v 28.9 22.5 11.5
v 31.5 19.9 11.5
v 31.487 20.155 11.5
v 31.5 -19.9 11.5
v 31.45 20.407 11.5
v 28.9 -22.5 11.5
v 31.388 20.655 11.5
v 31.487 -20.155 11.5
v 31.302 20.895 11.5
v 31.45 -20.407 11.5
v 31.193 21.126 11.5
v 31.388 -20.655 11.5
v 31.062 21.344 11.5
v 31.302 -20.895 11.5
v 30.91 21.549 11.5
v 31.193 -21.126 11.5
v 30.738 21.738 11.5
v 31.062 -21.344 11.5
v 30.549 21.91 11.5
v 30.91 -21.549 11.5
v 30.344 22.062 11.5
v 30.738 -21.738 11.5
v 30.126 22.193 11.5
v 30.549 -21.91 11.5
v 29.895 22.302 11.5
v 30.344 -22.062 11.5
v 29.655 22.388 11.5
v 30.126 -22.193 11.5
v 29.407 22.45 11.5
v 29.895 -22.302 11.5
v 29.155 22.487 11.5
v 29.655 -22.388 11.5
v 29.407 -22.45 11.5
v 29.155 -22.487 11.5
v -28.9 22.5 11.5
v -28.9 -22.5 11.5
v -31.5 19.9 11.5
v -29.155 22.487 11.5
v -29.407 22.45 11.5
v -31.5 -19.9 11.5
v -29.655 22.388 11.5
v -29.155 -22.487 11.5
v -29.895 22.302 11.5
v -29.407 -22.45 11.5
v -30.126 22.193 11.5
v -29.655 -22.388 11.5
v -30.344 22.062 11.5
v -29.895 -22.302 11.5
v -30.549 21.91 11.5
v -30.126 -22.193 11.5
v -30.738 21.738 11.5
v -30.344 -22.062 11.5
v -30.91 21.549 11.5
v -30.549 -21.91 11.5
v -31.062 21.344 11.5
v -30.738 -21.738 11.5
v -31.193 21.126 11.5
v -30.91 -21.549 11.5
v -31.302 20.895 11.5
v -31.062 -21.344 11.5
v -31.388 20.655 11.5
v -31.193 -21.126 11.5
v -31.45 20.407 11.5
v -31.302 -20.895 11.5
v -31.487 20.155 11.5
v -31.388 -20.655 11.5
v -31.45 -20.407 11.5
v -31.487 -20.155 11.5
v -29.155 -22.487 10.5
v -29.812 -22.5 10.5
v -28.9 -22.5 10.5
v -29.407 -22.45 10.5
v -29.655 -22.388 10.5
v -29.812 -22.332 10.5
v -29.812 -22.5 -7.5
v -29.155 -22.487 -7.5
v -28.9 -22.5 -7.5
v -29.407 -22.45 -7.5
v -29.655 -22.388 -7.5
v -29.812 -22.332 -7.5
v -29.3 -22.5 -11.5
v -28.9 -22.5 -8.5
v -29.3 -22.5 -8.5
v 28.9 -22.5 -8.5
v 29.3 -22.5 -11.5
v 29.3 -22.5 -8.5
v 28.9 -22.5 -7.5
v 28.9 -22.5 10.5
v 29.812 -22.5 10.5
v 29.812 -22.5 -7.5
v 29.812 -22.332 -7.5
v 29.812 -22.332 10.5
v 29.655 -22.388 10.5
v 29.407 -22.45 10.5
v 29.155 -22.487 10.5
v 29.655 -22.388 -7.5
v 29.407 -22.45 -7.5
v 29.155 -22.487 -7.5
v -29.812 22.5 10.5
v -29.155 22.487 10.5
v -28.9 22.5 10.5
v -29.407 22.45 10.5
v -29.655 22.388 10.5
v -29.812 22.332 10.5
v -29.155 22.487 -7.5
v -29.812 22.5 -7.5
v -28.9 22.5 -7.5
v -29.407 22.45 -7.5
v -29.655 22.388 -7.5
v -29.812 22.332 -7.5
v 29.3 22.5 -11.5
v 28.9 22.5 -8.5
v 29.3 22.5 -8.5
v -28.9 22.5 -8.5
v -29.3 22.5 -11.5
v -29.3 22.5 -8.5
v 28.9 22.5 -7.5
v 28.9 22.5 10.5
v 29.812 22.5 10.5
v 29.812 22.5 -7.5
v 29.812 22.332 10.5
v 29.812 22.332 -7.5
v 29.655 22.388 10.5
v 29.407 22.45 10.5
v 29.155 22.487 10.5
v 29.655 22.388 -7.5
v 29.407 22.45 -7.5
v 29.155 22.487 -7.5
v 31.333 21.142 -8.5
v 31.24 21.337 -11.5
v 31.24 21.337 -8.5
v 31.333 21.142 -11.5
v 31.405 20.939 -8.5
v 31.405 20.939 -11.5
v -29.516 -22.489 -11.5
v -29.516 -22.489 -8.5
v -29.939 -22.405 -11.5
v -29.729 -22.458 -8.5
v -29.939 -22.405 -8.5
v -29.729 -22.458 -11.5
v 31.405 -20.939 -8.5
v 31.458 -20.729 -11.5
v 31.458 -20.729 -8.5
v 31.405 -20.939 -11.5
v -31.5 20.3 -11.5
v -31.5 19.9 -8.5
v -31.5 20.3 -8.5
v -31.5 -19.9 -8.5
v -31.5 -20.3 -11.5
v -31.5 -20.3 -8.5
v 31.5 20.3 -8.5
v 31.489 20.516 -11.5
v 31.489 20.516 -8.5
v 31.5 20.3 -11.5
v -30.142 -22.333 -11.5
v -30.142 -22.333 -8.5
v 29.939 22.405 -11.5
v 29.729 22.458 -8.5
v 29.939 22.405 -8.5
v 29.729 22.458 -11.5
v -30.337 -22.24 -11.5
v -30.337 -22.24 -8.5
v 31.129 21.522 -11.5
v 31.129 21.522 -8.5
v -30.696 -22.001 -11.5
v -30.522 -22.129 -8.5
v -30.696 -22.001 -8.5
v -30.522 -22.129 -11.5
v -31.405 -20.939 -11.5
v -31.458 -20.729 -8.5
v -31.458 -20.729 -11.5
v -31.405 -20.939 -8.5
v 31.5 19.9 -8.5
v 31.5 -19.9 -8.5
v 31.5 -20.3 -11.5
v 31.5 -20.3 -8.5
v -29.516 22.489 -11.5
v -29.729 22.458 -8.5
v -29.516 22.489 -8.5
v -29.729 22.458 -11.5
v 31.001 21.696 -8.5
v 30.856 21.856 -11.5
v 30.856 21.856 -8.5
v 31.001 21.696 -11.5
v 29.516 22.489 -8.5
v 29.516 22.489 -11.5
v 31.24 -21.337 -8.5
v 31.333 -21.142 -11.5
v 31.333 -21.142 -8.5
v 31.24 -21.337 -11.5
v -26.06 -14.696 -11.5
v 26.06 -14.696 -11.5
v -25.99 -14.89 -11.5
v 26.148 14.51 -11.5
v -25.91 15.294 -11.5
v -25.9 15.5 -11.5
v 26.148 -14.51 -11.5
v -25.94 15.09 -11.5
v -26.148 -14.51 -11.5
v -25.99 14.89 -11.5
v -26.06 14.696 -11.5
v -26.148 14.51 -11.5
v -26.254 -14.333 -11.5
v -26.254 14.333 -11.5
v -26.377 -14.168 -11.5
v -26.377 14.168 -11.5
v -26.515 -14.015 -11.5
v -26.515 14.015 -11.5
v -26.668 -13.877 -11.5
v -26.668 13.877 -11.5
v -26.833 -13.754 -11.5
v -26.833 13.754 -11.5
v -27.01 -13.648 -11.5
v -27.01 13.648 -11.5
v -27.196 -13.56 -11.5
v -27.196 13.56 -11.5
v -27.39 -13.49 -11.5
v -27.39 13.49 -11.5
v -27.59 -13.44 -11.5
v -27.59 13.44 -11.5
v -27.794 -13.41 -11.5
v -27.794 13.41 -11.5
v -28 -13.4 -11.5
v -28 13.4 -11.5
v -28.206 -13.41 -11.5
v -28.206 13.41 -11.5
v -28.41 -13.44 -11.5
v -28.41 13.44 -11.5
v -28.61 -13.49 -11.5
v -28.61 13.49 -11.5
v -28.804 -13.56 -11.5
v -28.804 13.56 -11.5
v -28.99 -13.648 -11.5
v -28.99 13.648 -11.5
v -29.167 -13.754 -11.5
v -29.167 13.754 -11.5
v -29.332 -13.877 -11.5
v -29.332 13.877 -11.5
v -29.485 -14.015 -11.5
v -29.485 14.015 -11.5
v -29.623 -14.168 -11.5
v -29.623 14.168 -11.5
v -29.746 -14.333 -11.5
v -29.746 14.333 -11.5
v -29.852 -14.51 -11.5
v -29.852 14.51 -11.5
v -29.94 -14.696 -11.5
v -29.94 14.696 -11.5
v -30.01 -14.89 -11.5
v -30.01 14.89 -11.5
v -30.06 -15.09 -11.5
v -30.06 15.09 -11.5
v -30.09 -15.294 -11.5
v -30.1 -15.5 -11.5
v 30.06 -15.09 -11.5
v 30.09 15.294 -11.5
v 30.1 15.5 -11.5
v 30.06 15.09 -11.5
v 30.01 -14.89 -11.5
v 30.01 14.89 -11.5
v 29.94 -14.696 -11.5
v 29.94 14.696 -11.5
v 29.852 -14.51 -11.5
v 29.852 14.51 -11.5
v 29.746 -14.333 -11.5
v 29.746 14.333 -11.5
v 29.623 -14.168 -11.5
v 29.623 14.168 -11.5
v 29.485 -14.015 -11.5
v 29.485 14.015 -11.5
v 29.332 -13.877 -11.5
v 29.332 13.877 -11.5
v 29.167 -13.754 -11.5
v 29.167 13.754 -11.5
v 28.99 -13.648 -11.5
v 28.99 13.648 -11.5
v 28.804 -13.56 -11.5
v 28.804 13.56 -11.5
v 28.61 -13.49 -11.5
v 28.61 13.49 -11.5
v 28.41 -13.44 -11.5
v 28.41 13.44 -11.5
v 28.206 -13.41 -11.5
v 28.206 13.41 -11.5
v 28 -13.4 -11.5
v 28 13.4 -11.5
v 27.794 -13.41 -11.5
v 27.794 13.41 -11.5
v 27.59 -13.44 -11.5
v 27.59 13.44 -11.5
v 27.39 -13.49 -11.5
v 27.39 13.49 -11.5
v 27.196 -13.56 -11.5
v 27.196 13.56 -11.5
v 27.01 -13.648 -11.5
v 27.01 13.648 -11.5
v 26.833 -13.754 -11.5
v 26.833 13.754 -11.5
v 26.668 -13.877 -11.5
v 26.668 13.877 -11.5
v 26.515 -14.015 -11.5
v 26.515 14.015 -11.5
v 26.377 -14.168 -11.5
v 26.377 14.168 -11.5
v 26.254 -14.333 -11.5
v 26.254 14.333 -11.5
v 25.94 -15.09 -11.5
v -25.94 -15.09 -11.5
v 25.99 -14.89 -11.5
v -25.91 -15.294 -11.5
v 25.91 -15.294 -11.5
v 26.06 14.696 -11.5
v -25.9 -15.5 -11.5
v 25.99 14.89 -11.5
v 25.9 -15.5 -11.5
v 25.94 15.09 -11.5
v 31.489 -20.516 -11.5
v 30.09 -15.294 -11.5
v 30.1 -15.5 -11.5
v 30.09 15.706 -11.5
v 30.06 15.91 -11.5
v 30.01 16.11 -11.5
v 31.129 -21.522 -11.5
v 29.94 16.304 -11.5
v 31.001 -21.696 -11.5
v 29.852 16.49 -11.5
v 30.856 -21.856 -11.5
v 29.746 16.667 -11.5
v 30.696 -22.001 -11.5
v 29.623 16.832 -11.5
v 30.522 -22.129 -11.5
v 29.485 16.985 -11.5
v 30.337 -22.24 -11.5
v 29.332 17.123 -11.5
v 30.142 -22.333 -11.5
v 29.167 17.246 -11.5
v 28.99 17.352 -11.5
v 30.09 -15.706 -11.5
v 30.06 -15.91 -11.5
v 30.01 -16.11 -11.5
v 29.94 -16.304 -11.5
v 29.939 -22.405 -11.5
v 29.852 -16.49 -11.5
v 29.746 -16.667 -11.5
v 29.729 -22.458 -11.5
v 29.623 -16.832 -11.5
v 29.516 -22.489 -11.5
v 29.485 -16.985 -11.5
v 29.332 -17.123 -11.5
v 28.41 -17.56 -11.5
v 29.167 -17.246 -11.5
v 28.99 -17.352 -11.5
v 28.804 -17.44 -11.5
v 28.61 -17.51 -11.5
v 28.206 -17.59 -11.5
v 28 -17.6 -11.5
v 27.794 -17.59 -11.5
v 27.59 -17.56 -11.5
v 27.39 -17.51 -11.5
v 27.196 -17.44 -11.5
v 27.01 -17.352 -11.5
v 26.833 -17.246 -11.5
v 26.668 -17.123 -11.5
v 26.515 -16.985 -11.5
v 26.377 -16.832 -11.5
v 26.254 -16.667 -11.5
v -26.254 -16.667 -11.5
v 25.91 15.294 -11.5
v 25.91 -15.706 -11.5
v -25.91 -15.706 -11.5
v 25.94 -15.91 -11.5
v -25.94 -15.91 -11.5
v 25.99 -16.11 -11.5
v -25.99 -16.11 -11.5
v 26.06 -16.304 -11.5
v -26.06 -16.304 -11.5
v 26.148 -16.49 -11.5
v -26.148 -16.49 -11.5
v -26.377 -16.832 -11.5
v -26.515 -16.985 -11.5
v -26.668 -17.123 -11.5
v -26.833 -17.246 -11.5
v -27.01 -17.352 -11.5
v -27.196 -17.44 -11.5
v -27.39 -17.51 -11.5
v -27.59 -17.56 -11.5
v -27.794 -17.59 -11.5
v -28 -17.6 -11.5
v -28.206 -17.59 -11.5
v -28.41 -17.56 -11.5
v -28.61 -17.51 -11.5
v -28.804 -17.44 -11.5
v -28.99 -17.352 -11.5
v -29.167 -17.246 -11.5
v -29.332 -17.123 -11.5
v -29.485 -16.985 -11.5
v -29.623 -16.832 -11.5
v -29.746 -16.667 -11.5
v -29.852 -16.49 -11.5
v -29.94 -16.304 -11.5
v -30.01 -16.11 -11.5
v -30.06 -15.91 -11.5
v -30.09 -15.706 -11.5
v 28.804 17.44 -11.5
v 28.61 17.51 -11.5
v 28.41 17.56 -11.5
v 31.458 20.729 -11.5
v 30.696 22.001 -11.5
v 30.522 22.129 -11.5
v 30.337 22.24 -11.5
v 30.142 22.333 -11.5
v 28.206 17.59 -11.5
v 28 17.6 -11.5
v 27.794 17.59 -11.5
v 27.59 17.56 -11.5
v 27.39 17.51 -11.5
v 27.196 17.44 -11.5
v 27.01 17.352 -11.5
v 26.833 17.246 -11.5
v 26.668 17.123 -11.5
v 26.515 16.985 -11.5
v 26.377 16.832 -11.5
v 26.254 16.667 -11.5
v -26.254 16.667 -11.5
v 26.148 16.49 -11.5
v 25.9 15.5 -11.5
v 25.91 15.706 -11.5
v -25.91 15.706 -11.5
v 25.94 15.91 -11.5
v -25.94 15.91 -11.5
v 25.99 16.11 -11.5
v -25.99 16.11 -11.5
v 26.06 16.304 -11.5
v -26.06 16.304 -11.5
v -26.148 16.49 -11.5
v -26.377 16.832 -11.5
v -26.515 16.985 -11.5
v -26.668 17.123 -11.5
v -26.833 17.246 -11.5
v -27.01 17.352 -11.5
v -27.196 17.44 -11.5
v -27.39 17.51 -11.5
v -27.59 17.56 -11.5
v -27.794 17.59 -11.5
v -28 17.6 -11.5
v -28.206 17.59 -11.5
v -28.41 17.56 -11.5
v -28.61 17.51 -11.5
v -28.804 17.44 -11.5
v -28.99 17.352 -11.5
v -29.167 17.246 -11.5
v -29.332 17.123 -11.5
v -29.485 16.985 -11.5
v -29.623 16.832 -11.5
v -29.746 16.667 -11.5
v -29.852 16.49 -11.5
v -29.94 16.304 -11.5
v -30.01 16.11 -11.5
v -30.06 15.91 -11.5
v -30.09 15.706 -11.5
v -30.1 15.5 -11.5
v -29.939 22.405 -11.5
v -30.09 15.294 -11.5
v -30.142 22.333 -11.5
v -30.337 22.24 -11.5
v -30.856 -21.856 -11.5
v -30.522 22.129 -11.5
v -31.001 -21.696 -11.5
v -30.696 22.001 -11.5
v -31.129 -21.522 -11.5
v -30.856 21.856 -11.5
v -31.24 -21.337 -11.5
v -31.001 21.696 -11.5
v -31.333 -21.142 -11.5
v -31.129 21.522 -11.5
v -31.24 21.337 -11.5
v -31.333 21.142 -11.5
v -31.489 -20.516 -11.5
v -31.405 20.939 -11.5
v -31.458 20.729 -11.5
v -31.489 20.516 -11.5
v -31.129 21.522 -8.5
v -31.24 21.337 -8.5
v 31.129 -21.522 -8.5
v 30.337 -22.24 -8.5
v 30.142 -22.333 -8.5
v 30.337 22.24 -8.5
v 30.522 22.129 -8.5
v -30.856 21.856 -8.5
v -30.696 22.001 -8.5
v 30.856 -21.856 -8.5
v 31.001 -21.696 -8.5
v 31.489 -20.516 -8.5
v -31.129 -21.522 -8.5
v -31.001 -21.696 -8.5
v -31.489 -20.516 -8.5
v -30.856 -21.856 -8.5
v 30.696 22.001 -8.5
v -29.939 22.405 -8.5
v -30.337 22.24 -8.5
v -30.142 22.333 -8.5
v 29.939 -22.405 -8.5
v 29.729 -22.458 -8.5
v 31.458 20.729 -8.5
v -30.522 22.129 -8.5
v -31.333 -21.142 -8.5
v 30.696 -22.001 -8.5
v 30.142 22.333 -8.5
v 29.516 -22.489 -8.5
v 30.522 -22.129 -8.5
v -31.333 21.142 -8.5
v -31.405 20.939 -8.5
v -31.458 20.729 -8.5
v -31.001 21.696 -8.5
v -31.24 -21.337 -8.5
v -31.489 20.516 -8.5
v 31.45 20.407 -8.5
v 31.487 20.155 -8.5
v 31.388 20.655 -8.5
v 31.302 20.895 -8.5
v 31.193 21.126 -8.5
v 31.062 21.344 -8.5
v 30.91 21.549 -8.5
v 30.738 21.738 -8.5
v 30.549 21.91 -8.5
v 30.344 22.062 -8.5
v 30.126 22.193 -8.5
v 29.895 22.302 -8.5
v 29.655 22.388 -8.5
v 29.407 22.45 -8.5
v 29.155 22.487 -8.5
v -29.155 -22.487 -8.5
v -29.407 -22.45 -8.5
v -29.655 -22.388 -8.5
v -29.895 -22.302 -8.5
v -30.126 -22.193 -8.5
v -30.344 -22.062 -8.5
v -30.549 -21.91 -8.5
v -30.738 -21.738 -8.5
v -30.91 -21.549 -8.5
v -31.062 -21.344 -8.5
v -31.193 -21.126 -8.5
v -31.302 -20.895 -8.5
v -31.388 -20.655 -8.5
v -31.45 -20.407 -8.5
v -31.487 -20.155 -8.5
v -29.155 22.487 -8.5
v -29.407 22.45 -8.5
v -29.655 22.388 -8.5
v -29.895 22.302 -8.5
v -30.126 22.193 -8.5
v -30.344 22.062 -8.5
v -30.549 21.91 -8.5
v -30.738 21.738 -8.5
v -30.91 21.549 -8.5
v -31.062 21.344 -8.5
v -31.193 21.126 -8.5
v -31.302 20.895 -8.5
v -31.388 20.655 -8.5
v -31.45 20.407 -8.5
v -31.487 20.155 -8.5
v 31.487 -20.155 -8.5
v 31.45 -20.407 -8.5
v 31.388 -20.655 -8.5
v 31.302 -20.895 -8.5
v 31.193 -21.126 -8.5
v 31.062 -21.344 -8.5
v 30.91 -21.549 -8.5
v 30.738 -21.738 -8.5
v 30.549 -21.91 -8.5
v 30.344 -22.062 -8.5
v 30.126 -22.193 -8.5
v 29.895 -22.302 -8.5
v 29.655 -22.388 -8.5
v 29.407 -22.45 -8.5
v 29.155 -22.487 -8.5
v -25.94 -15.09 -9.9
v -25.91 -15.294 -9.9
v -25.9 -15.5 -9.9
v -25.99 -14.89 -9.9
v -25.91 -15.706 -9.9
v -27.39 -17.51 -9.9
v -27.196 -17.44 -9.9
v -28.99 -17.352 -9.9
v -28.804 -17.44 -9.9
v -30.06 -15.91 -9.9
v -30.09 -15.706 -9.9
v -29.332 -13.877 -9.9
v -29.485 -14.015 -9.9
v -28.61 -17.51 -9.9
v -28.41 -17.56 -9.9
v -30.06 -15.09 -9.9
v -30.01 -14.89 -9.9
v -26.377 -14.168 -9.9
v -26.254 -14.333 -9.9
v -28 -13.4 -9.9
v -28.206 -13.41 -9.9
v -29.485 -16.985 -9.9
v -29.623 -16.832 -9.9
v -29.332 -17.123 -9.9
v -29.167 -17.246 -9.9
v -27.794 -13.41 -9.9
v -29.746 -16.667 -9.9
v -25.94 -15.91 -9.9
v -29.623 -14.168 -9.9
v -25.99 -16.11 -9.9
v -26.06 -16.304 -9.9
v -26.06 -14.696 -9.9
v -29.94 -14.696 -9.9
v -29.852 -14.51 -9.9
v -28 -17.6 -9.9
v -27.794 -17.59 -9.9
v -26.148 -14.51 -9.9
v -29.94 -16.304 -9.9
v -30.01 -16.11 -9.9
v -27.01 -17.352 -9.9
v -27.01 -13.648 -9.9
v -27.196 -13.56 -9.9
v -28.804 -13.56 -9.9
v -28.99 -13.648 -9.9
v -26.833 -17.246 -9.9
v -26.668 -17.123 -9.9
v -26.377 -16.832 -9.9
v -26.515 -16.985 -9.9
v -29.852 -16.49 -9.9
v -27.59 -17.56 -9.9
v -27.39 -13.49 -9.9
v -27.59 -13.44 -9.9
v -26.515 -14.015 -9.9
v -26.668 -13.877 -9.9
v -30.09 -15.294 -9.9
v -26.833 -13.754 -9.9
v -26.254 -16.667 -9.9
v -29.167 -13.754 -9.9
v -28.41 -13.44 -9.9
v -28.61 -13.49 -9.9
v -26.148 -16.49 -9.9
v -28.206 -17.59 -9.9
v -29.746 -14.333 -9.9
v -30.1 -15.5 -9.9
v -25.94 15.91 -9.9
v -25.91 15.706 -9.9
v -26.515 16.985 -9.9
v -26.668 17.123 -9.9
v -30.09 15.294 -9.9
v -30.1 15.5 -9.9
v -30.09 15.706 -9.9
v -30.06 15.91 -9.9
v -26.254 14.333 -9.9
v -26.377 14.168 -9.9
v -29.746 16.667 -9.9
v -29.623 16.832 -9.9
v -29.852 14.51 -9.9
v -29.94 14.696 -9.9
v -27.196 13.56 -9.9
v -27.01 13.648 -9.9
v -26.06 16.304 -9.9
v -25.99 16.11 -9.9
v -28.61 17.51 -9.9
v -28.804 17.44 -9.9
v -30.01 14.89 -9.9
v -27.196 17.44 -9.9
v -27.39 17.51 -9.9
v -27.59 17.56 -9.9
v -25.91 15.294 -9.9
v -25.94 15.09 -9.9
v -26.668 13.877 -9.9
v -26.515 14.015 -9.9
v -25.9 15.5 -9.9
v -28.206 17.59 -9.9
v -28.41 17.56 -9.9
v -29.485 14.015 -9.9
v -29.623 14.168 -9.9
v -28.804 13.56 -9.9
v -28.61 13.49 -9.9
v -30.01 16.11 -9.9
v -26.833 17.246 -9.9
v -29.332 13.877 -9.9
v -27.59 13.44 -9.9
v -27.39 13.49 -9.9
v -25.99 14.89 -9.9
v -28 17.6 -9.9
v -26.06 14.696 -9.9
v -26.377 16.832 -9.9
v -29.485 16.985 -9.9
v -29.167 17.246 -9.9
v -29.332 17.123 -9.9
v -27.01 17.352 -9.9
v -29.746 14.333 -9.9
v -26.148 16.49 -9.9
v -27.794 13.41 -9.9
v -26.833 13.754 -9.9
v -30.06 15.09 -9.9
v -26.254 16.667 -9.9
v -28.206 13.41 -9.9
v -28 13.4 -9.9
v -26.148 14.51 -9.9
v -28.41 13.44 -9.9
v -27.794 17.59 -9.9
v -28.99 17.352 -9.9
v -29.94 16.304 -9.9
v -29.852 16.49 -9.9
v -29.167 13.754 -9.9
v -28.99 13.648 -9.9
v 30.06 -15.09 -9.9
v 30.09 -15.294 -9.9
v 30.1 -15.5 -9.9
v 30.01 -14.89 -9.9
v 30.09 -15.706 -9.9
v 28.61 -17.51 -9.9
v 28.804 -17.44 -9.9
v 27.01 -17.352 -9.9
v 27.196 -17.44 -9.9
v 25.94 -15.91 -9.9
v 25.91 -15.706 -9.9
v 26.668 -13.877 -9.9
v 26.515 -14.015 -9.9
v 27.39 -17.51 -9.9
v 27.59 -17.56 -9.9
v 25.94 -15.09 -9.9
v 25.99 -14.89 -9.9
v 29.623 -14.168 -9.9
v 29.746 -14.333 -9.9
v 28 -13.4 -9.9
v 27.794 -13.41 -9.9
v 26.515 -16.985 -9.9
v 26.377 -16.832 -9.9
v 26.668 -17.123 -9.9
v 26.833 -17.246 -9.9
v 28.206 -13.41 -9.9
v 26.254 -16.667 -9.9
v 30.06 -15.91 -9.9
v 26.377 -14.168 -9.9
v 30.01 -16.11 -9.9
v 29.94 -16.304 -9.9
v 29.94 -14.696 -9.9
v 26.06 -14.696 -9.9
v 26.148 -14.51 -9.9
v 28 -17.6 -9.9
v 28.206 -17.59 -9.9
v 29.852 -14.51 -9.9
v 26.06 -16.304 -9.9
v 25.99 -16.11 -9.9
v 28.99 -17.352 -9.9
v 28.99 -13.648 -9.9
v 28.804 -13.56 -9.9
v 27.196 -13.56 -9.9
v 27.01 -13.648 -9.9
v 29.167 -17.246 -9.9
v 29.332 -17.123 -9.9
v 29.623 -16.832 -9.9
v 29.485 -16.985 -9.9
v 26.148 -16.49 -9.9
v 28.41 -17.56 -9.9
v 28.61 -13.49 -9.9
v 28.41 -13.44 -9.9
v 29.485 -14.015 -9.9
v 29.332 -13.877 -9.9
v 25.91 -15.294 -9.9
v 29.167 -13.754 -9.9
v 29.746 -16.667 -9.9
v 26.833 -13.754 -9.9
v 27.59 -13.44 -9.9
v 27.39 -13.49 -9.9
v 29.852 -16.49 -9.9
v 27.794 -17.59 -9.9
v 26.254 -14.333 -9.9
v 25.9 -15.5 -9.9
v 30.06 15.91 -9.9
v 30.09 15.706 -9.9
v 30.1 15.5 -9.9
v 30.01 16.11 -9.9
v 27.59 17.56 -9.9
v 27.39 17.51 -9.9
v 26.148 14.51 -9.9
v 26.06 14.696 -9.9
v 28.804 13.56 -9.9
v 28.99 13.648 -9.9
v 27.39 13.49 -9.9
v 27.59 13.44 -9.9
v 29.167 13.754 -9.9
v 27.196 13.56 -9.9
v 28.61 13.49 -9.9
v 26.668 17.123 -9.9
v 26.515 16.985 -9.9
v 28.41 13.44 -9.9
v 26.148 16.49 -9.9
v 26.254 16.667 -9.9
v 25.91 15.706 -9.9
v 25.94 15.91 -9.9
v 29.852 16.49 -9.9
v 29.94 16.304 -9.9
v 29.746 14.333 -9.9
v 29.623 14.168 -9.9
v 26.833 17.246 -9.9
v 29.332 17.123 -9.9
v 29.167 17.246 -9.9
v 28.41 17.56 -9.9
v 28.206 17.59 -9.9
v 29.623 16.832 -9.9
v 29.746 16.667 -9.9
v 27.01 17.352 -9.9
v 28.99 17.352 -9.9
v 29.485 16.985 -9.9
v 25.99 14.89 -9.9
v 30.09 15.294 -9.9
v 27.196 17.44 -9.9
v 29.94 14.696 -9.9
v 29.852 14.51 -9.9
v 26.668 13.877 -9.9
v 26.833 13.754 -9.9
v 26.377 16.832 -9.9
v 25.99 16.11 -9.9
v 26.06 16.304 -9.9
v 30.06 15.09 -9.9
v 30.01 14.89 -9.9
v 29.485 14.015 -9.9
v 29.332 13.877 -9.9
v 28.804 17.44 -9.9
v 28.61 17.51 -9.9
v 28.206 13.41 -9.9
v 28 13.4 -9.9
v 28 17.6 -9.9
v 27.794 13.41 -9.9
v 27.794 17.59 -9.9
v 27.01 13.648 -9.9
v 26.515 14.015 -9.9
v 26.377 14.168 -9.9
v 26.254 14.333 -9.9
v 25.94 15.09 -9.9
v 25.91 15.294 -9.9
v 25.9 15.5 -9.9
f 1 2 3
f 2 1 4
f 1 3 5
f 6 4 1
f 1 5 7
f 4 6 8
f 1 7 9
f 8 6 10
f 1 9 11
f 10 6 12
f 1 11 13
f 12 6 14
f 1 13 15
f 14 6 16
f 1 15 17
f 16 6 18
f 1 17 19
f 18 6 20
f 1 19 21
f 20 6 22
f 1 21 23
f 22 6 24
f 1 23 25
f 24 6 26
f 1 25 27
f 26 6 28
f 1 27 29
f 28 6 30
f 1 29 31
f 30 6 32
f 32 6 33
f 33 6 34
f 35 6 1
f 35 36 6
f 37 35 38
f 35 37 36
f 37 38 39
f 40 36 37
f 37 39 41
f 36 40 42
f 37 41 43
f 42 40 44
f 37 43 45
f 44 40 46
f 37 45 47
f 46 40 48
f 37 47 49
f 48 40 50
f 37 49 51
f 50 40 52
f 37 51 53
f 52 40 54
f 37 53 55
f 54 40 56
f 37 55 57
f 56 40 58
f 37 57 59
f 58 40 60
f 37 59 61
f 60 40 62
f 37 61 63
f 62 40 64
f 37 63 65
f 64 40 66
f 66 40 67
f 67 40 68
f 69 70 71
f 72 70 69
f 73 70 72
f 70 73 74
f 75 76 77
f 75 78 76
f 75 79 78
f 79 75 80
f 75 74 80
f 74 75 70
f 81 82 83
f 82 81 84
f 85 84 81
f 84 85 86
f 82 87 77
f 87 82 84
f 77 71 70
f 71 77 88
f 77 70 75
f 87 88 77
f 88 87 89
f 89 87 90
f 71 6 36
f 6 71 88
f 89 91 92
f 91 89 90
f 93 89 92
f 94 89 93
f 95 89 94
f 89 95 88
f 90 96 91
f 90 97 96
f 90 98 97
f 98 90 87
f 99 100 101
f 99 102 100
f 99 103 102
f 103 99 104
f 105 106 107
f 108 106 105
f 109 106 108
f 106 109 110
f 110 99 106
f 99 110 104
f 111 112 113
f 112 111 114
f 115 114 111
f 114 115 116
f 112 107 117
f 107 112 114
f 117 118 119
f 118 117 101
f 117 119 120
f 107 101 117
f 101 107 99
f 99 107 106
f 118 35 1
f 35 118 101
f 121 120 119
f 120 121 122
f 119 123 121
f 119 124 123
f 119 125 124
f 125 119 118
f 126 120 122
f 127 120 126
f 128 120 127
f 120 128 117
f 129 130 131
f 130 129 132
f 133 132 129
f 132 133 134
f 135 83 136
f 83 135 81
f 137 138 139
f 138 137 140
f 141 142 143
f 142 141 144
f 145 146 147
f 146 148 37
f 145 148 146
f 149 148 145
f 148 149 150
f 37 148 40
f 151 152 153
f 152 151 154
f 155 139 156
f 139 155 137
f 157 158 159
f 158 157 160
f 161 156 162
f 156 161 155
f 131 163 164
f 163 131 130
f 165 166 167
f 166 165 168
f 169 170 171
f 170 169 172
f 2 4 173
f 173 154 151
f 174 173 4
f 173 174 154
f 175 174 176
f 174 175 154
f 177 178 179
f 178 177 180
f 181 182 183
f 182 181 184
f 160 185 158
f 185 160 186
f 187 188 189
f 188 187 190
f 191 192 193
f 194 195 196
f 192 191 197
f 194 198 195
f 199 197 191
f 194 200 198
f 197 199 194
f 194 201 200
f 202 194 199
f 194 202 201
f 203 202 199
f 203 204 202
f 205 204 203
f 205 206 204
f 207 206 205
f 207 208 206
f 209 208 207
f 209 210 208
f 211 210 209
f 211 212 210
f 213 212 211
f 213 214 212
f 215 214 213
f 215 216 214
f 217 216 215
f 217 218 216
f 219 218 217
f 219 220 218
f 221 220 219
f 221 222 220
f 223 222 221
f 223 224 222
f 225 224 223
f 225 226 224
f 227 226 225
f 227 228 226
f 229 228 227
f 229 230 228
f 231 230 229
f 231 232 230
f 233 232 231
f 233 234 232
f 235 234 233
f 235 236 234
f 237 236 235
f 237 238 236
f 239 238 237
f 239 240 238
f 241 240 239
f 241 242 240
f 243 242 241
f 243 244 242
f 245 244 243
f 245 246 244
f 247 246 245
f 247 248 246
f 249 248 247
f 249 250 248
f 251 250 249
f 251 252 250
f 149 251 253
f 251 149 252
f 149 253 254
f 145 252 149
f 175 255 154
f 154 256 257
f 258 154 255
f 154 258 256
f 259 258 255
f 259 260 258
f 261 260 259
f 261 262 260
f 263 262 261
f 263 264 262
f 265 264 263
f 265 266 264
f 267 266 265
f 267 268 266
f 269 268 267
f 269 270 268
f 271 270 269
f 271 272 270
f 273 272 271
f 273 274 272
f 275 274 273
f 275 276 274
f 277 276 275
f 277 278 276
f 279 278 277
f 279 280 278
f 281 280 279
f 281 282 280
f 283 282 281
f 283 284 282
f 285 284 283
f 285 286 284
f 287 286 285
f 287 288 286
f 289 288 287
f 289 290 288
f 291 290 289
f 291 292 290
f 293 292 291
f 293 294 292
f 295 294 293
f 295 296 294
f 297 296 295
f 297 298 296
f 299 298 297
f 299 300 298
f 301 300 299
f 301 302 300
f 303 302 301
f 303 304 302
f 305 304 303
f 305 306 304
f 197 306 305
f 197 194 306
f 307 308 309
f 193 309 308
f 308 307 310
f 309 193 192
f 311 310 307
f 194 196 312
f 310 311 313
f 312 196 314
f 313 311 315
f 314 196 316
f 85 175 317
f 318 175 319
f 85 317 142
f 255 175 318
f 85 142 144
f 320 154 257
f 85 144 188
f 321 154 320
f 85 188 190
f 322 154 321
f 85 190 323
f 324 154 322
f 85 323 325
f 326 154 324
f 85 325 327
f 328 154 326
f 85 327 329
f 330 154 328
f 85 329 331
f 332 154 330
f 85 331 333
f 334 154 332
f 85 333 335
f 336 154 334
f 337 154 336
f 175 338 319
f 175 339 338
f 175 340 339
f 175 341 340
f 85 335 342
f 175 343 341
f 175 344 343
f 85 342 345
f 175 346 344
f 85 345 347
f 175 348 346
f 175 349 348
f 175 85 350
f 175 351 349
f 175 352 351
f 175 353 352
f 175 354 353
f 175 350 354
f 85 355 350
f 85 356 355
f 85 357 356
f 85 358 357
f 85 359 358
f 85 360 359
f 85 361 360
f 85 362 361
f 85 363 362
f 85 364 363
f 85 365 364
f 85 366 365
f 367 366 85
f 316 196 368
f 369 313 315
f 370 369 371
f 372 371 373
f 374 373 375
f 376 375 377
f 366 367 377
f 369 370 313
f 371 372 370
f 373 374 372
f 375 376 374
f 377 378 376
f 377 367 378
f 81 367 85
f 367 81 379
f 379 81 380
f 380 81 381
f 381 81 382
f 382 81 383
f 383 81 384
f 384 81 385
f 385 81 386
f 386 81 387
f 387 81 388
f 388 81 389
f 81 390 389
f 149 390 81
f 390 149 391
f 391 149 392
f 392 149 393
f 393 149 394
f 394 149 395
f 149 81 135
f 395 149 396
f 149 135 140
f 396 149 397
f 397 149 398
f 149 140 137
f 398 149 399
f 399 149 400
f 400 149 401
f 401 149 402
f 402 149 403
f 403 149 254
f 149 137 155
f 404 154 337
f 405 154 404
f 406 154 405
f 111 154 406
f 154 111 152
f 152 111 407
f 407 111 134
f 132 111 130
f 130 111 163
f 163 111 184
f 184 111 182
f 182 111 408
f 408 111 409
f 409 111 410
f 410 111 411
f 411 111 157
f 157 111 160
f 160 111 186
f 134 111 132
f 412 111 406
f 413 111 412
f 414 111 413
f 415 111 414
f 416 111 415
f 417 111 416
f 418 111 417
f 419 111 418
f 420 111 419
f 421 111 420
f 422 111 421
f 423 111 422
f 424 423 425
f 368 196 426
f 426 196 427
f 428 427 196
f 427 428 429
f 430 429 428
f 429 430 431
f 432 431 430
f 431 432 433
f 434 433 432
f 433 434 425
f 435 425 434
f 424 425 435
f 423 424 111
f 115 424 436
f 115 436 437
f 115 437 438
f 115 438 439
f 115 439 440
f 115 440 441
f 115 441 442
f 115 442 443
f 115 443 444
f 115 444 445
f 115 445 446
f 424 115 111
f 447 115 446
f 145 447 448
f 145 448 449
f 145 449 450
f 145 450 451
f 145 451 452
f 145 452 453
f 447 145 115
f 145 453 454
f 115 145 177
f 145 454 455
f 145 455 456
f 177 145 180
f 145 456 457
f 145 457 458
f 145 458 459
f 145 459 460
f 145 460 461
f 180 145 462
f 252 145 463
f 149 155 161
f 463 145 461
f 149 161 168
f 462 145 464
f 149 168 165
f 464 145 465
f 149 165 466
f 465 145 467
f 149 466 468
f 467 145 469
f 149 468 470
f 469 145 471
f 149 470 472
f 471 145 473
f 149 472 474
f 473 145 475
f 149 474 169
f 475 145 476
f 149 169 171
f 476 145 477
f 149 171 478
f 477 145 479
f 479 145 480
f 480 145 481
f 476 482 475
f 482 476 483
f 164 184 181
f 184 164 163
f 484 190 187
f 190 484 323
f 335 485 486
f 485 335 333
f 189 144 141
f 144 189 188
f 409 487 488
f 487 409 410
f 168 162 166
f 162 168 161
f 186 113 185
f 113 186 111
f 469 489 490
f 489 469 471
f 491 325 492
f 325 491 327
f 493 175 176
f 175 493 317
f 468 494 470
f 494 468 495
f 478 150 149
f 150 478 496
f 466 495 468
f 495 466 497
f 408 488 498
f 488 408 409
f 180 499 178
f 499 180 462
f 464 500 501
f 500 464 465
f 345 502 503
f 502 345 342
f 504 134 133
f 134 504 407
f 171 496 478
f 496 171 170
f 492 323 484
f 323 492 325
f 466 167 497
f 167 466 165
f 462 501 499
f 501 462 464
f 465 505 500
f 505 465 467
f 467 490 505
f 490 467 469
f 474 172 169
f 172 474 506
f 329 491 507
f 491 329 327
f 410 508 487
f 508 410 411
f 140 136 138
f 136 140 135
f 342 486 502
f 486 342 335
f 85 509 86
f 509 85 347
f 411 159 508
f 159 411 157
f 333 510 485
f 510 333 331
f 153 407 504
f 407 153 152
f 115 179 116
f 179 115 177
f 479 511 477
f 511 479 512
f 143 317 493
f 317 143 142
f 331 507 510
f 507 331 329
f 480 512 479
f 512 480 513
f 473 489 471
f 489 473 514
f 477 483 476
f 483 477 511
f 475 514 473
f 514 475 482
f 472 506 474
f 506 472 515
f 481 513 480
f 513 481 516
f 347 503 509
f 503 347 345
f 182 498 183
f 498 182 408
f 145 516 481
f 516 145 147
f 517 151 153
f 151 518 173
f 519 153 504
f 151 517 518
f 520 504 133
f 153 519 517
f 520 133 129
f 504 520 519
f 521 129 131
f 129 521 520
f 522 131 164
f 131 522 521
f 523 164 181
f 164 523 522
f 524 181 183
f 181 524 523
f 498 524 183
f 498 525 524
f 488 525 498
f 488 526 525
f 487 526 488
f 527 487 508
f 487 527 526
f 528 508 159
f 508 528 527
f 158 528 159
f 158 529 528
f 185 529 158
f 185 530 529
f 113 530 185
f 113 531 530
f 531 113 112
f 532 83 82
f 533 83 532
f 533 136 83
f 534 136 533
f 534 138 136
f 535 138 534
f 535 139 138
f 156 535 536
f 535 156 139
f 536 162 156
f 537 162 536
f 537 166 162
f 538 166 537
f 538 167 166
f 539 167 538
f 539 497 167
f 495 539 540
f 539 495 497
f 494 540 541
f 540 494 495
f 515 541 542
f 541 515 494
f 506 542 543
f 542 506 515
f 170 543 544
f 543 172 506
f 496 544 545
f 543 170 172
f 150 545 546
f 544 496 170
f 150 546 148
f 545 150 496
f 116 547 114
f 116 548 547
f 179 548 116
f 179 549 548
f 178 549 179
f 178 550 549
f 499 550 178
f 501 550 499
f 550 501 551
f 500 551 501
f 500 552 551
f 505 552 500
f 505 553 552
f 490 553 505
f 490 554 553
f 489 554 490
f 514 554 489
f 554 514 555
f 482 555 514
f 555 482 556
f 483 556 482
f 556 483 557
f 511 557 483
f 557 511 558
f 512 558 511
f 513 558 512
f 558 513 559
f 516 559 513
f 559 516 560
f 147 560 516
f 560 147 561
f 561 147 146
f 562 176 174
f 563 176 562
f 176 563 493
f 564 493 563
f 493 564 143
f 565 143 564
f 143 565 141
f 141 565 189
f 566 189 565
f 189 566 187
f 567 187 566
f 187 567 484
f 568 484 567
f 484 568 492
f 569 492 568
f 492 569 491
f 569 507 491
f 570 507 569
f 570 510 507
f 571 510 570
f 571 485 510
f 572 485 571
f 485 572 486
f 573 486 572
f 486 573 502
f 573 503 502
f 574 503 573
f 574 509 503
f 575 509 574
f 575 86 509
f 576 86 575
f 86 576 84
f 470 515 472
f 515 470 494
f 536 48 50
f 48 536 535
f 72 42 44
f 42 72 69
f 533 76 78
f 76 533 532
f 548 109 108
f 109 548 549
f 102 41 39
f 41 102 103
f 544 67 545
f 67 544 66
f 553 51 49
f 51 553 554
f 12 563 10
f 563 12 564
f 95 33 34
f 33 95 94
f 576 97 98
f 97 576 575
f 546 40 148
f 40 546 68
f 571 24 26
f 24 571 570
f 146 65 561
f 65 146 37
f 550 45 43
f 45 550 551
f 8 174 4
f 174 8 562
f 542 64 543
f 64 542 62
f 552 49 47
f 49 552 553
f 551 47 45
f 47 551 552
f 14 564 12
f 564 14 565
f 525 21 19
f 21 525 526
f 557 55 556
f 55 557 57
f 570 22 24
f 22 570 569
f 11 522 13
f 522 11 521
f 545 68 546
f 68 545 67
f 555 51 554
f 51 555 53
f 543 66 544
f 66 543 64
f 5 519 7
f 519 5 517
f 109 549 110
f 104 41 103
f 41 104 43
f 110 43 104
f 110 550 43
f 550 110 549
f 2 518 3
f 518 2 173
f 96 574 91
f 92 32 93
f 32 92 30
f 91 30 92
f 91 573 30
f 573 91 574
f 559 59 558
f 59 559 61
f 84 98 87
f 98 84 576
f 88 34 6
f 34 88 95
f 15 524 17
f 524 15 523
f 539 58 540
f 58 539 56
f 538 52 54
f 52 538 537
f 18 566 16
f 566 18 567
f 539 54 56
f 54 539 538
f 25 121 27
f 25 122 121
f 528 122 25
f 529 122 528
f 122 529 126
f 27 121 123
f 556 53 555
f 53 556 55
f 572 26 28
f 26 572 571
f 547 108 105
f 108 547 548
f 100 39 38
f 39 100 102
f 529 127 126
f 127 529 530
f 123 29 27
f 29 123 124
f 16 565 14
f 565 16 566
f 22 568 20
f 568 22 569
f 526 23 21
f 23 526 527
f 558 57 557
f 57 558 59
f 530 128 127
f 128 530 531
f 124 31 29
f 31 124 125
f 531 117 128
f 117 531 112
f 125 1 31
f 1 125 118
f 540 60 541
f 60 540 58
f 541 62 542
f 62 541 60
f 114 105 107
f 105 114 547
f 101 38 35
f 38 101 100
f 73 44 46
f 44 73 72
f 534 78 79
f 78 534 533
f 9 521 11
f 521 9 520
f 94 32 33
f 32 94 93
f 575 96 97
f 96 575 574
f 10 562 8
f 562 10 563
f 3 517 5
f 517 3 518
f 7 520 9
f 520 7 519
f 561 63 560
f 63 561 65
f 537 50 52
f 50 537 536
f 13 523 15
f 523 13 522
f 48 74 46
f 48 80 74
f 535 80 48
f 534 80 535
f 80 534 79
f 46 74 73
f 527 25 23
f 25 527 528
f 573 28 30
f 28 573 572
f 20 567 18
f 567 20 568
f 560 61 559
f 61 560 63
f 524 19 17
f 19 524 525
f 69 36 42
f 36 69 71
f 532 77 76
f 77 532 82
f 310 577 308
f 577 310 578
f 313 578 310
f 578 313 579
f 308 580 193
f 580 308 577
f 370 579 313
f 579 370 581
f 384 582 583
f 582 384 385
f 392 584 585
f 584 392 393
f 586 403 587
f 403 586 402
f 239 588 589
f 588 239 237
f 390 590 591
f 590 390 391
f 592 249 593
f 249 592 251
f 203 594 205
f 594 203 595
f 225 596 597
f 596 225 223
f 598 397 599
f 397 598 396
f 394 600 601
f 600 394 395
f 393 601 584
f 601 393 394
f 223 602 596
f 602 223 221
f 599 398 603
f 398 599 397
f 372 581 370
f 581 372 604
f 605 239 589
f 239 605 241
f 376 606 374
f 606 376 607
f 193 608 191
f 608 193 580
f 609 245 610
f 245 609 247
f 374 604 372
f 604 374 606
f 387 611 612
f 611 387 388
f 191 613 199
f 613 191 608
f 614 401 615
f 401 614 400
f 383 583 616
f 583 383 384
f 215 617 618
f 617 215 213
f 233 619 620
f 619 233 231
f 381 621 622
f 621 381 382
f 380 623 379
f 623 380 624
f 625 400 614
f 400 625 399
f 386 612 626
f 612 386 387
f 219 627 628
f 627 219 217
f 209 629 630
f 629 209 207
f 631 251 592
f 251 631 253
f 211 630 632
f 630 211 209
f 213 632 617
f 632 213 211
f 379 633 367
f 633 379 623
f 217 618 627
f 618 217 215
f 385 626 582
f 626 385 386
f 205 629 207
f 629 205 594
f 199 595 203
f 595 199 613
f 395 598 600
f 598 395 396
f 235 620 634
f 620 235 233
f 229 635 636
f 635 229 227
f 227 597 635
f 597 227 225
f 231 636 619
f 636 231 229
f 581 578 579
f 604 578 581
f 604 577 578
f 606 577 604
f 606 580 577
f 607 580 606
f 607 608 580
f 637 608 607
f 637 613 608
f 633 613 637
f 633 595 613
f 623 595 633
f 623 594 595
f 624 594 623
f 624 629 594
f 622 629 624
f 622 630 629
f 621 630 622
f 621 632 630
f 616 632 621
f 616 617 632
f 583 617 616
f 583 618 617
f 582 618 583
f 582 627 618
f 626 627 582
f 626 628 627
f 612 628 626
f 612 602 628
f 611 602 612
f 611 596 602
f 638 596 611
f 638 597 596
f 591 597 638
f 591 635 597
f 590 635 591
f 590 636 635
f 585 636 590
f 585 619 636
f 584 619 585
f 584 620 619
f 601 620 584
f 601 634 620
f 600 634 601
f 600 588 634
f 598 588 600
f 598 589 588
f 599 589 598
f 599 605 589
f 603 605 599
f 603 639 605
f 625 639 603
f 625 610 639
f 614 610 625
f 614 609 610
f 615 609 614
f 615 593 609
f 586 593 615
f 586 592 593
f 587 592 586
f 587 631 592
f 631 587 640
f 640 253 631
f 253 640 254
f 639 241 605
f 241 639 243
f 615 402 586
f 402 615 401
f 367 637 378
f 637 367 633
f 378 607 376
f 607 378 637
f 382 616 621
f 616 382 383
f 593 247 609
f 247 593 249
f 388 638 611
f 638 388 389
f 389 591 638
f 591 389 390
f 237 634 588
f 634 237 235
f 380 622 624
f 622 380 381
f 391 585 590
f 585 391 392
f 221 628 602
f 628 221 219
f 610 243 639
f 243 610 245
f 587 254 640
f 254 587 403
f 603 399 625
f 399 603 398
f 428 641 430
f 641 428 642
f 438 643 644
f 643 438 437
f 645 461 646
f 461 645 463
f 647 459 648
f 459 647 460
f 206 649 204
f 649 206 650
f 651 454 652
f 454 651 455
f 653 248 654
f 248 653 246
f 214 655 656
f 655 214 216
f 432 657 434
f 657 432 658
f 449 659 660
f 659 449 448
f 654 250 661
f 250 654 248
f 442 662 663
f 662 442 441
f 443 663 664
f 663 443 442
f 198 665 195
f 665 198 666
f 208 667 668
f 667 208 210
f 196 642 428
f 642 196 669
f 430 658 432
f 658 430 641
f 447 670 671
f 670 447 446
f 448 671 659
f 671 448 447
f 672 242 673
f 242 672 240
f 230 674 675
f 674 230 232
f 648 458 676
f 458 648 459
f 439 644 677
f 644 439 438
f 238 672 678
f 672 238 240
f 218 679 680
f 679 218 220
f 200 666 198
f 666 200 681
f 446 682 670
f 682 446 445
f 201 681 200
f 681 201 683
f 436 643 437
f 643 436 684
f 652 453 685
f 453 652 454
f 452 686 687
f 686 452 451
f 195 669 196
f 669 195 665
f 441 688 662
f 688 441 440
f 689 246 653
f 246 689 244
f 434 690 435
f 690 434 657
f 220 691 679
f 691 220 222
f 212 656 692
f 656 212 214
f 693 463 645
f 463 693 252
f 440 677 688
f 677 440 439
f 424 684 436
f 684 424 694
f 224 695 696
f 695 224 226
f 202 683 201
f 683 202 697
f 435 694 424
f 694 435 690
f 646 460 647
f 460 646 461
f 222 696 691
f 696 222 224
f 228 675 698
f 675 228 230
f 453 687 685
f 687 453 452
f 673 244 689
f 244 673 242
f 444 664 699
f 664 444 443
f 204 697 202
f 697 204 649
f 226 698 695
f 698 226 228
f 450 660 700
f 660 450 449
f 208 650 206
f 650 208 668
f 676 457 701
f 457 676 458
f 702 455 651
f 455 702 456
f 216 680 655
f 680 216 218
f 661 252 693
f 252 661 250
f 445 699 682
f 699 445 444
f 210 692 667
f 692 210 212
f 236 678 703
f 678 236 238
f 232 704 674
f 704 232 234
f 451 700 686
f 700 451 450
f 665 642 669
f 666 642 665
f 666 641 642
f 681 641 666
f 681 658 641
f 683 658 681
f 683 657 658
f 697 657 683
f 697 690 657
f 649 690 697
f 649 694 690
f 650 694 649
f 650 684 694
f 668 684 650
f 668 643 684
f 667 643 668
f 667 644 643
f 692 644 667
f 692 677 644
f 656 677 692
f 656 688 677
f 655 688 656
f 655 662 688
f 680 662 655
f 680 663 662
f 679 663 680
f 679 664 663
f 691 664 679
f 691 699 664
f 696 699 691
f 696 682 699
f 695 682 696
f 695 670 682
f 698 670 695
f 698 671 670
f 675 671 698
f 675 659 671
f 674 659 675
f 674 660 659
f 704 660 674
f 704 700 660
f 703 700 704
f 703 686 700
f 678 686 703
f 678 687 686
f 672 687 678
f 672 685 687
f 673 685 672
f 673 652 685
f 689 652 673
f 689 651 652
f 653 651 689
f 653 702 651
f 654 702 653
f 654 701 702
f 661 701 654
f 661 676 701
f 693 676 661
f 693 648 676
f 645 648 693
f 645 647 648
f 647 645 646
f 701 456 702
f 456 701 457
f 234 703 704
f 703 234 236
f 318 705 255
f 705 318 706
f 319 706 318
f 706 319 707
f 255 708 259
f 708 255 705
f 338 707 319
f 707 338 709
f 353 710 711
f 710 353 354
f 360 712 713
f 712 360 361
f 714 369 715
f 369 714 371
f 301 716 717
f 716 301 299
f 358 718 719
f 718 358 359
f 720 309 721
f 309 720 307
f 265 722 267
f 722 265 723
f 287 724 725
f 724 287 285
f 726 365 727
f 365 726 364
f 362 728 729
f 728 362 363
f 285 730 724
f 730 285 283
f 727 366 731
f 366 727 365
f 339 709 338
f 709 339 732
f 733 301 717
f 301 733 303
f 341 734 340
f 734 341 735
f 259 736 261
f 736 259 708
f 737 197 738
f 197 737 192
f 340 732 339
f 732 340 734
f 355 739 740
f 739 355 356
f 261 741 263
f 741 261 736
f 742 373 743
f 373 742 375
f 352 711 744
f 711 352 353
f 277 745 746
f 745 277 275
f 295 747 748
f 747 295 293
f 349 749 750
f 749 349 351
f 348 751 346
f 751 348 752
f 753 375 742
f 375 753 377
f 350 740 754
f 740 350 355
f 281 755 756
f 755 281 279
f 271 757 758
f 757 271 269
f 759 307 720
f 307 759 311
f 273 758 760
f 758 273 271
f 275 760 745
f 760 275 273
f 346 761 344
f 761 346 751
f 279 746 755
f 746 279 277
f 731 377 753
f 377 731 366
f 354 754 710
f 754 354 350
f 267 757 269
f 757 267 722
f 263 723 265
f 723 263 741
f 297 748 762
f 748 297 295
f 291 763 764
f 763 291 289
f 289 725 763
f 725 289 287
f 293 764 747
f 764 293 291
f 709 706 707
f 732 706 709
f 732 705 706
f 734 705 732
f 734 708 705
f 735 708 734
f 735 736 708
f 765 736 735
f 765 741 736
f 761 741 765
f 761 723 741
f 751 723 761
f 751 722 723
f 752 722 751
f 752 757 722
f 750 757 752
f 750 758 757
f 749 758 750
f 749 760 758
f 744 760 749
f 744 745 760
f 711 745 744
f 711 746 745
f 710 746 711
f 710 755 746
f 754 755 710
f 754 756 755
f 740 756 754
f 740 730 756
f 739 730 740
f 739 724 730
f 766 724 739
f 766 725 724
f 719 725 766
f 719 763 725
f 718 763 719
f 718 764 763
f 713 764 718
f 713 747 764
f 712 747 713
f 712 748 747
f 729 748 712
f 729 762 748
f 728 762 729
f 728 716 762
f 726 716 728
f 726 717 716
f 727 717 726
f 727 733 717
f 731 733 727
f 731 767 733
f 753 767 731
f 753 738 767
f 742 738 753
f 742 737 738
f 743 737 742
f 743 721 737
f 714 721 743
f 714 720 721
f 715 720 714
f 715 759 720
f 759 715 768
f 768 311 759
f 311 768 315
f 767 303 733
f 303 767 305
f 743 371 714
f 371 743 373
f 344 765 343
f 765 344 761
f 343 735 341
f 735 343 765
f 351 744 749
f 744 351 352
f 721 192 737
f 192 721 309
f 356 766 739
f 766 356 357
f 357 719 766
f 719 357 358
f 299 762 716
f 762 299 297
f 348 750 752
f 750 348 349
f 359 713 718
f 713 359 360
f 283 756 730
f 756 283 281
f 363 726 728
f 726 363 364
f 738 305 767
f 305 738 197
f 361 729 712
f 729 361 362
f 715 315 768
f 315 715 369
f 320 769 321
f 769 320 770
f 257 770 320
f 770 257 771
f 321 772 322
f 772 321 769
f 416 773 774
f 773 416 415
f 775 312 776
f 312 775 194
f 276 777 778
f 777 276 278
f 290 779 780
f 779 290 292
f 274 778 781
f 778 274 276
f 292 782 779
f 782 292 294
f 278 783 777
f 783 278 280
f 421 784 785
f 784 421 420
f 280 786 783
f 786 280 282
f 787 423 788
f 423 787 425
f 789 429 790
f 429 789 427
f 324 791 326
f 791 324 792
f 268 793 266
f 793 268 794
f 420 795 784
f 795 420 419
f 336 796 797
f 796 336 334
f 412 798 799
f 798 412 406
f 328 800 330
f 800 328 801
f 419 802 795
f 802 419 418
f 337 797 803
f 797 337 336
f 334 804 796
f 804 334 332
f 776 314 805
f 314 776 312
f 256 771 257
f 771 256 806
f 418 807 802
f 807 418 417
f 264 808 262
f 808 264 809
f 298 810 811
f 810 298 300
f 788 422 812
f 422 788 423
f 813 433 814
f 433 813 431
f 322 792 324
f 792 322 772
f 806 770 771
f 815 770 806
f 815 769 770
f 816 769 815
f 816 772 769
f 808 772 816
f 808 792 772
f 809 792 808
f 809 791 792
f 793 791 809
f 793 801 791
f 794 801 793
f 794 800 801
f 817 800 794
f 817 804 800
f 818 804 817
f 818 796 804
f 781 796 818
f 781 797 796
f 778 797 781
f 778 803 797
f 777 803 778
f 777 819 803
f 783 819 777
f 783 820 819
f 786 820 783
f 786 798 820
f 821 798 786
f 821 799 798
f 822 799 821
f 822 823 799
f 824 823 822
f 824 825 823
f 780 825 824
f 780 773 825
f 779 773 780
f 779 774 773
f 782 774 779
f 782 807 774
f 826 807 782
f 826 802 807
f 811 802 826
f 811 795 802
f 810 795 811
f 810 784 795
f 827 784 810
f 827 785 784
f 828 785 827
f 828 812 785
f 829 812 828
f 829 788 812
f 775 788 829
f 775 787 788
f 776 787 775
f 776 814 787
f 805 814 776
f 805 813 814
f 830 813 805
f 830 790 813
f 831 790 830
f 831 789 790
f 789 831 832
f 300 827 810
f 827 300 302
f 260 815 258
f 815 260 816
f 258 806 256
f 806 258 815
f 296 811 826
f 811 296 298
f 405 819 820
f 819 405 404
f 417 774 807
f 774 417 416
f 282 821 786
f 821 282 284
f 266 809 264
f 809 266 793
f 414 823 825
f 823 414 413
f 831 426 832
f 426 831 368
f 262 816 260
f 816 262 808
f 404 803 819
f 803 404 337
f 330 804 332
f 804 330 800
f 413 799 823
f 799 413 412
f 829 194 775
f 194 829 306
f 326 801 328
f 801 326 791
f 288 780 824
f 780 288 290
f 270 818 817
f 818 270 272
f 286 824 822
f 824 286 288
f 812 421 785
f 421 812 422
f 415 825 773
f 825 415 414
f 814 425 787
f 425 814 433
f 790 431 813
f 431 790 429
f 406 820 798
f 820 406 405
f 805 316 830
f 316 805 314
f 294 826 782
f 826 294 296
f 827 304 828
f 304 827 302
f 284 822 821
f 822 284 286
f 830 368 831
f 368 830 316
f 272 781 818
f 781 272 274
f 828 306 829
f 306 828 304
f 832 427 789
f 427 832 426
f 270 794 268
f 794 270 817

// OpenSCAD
// Solid State Relay module (single connected solid)
// Overall envelope: 63.0mm x 45.0mm x 23.0mm

length = 63;  // X
width  = 45;  // Y
height = 23;  // Z

$fn = 64;

module rbox(size=[10,10,10], r=2, center=true) {
    // Rounded box via hull of corner cylinders (fast, predictable)
    sx = size[0]; sy = size[1]; sz = size[2];
    rr = min(r, sx/2, sy/2);
    translate(center ? [0,0,0] : [sx/2, sy/2, sz/2])
        hull() {
            for (ix=[-1,1], iy=[-1,1])
                translate([ix*(sx/2-rr), iy*(sy/2-rr), 0])
                    cylinder(r=rr, h=sz, center=true);
        }
}

module ssr_module() {
    // Envelope split
    base_h = 3.0;
    body_h = height - base_h;

    // Corner radii
    base_r = 2.2;
    body_r = 2.6;

    // Top step (slight inset on top surface)
    top_step_h = 1.6;
    top_step_inset = 1.2; // inset on X and Y

    // Terminal blocks (two) on top near +Y
    term_w = 18;   // X
    term_d = 12;   // Y
    term_h = 6;    // Z
    term_gap = 6;  // gap between blocks along X
    term_y_margin = 2.0;

    // Screw bosses on terminal blocks
    boss_d = 5.2;
    boss_h = 2.2;

    // Mounting ears (integrated) on left/right ends, within envelope
    ear_w = 7.0;                 // X thickness of ear region
    ear_d = width - 6.0;         // Y span of ear region
    ear_h = base_h;              // same as base thickness
    ear_r = 2.0;

    // Mounting recesses (shallow) on bottom, aligned with ears
    hole_d = 4.2;
    hole_depth = 1.6;
    hole_x = length/2 - ear_w/2; // centered in ear region
    hole_y = width/2 - 7.0;

    // Side fins (heatsink suggestion) on both long sides (±Y), connected
    fin_t = 1.2;
    fin_h = body_h - 2.0;
    fin_len = length - 10.0;
    fin_count = 6;
    fin_z0 = -height/2 + base_h + fin_h/2 + 1.0; // connected into housing

    // Front face raised label pad (adds detail without subtracting)
    pad_t = 0.9;
    pad_w = length - 14.0;
    pad_h = body_h - 7.0;
    pad_z = -height/2 + base_h + body_h/2;

    // Derived placements (formula-based)
    term_y = width/2 - term_d/2 - term_y_margin;
    term_x_center_offset = (term_w/2 + term_gap/2);
    term_z = height/2 - term_h/2;

    difference() {
        union() {
            // Base (includes ears as part of base footprint)
            translate([0,0,-height/2 + base_h/2])
                rbox([length, width, base_h], r=base_r, center=true);

            // Main housing
            translate([0,0,-height/2 + base_h + body_h/2])
                rbox([length, width, body_h], r=body_r, center=true);

            // Top step (slightly inset plateau) to break up silhouette
            translate([0,0,height/2 - top_step_h/2])
                rbox([length - 2*top_step_inset, width - 2*top_step_inset, top_step_h],
                     r=max(0.8, body_r-0.8), center=true);

            // Front face pad (+Y face)
            translate([0, width/2 - pad_t/2, pad_z])
                cube([pad_w, pad_t, pad_h], center=true);

            // Terminal blocks (two) on top near +Y
            for (sx = [-1, 1]) {
                translate([sx*term_x_center_offset, term_y, term_z])
                    rbox([term_w, term_d, term_h], r=1.2, center=true);

                // Two screw bosses per terminal block
                for (bx = [-1, 1]) {
                    translate([sx*term_x_center_offset + bx*(term_w*0.25), term_y, height/2 - boss_h/2])
                        cylinder(d=boss_d, h=boss_h, center=true);
                }
            }

            // Side fins on both ±Y sides (protrude slightly, but stay within envelope)
            // Place fins so their outer face is flush with width/2 (no envelope growth)
            for (side = [-1, 1]) {
                for (i = [0:fin_count-1]) {
                    x_pos = (-(fin_len/2) + i*(fin_len/(fin_count-1)));
                    translate([x_pos, side*(width/2 - fin_t/2), fin_z0])
                        cube([fin_len/fin_count*0.75, fin_t, fin_h], center=true);
                }
            }

            // Small cable/terminal lip at top front edge (+Y, +Z), connected
            lip_h = 1.4;
            lip_d = 2.2;
            lip_w = length - 8.0;
            translate([0, width/2 - lip_d/2, height/2 - top_step_h - lip_h/2])
                rbox([lip_w, lip_d, lip_h], r=0.8, center=true);
        }

        // Bottom mounting recesses (shallow dimples) - keep one connected solid
        for (sx = [-1, 1], sy = [-1, 1]) {
            translate([sx*hole_x, sy*hole_y, -height/2 + hole_depth/2])
                cylinder(d=hole_d, h=hole_depth, center=true);
        }
    }
}

// Render
ssr_module();
